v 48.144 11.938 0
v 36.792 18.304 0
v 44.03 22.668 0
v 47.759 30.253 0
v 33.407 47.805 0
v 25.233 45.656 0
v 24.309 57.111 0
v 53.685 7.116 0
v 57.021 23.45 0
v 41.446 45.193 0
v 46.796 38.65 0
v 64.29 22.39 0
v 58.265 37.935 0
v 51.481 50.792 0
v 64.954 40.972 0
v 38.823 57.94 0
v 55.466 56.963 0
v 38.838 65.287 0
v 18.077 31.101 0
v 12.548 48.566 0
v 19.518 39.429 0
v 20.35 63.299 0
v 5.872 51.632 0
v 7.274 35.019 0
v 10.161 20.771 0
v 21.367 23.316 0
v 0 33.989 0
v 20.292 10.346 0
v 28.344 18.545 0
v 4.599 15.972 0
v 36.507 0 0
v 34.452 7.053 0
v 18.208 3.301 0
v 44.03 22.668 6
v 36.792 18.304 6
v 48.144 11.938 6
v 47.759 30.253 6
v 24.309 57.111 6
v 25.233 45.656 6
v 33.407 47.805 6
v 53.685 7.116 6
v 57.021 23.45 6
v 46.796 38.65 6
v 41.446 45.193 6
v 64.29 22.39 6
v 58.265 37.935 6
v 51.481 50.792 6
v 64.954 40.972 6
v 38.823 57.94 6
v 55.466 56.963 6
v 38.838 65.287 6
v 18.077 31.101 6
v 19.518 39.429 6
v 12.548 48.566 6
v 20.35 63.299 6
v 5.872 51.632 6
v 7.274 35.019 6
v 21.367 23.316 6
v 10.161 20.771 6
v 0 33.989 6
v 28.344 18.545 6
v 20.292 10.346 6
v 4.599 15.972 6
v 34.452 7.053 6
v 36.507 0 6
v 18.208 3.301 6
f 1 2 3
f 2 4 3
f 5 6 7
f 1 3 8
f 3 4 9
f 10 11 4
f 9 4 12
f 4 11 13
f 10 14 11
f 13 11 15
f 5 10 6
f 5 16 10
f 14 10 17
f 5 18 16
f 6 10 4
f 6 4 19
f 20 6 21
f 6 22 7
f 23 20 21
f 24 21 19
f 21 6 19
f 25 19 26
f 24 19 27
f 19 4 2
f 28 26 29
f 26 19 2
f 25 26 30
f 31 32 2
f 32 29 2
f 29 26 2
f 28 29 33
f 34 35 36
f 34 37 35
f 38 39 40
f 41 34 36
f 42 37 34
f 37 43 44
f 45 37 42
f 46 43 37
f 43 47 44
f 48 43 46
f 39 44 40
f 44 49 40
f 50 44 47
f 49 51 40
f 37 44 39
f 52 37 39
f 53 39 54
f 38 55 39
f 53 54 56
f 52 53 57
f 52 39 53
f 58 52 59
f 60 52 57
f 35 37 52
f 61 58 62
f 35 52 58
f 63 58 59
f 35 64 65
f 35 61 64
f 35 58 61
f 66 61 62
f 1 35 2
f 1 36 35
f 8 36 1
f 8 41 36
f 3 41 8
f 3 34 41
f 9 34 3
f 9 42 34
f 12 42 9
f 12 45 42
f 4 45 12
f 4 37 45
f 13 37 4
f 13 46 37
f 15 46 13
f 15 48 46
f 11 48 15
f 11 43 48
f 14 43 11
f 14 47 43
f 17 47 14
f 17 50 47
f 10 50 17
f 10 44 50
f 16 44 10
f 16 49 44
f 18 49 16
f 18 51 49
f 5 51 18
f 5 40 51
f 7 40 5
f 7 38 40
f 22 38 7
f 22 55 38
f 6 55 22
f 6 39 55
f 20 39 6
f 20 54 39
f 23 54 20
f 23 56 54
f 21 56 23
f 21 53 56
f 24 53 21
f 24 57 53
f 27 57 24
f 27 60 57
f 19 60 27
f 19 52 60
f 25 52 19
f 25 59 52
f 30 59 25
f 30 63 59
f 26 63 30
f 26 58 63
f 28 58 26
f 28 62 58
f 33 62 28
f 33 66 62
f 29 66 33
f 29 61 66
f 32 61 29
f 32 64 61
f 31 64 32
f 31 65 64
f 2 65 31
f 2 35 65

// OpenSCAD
$fn = 32;

// ----------------------------------------------------------------------
// Fan rotor section: 11 blades, 15 mm hub radius, 18 mm blades
// ----------------------------------------------------------------------

// --- parameters (mm) ---
profile_height = 6;       // extrusion height
profile_points = 33;      // points of the closed outline

profile = [[47.759, 30.253], [58.265, 37.935], [64.954, 40.972], [46.796, 38.65], [51.481, 50.792], [55.466, 56.963], [41.446, 45.193], [38.823, 57.94], [38.838, 65.287], [33.407, 47.805], [24.309, 57.111], [20.35, 63.299], [25.233, 45.656], [12.548, 48.566], [5.872, 51.632], [19.518, 39.429], [7.274, 35.019], [0, 33.989], [18.077, 31.101], [10.161, 20.771], [4.599, 15.972], [21.367, 23.316], [20.292, 10.346], [18.208, 3.301], [28.344, 18.545], [34.452, 7.053], [36.507, 0], [36.792, 18.304], [48.144, 11.938], [53.685, 7.116], [44.03, 22.668], [57.021, 23.45], [64.29, 22.39]];  // single closed polygon, 33 points, counter clockwise

// --- the one profile operation ---
linear_extrude(height = profile_height) polygon(points = profile);
